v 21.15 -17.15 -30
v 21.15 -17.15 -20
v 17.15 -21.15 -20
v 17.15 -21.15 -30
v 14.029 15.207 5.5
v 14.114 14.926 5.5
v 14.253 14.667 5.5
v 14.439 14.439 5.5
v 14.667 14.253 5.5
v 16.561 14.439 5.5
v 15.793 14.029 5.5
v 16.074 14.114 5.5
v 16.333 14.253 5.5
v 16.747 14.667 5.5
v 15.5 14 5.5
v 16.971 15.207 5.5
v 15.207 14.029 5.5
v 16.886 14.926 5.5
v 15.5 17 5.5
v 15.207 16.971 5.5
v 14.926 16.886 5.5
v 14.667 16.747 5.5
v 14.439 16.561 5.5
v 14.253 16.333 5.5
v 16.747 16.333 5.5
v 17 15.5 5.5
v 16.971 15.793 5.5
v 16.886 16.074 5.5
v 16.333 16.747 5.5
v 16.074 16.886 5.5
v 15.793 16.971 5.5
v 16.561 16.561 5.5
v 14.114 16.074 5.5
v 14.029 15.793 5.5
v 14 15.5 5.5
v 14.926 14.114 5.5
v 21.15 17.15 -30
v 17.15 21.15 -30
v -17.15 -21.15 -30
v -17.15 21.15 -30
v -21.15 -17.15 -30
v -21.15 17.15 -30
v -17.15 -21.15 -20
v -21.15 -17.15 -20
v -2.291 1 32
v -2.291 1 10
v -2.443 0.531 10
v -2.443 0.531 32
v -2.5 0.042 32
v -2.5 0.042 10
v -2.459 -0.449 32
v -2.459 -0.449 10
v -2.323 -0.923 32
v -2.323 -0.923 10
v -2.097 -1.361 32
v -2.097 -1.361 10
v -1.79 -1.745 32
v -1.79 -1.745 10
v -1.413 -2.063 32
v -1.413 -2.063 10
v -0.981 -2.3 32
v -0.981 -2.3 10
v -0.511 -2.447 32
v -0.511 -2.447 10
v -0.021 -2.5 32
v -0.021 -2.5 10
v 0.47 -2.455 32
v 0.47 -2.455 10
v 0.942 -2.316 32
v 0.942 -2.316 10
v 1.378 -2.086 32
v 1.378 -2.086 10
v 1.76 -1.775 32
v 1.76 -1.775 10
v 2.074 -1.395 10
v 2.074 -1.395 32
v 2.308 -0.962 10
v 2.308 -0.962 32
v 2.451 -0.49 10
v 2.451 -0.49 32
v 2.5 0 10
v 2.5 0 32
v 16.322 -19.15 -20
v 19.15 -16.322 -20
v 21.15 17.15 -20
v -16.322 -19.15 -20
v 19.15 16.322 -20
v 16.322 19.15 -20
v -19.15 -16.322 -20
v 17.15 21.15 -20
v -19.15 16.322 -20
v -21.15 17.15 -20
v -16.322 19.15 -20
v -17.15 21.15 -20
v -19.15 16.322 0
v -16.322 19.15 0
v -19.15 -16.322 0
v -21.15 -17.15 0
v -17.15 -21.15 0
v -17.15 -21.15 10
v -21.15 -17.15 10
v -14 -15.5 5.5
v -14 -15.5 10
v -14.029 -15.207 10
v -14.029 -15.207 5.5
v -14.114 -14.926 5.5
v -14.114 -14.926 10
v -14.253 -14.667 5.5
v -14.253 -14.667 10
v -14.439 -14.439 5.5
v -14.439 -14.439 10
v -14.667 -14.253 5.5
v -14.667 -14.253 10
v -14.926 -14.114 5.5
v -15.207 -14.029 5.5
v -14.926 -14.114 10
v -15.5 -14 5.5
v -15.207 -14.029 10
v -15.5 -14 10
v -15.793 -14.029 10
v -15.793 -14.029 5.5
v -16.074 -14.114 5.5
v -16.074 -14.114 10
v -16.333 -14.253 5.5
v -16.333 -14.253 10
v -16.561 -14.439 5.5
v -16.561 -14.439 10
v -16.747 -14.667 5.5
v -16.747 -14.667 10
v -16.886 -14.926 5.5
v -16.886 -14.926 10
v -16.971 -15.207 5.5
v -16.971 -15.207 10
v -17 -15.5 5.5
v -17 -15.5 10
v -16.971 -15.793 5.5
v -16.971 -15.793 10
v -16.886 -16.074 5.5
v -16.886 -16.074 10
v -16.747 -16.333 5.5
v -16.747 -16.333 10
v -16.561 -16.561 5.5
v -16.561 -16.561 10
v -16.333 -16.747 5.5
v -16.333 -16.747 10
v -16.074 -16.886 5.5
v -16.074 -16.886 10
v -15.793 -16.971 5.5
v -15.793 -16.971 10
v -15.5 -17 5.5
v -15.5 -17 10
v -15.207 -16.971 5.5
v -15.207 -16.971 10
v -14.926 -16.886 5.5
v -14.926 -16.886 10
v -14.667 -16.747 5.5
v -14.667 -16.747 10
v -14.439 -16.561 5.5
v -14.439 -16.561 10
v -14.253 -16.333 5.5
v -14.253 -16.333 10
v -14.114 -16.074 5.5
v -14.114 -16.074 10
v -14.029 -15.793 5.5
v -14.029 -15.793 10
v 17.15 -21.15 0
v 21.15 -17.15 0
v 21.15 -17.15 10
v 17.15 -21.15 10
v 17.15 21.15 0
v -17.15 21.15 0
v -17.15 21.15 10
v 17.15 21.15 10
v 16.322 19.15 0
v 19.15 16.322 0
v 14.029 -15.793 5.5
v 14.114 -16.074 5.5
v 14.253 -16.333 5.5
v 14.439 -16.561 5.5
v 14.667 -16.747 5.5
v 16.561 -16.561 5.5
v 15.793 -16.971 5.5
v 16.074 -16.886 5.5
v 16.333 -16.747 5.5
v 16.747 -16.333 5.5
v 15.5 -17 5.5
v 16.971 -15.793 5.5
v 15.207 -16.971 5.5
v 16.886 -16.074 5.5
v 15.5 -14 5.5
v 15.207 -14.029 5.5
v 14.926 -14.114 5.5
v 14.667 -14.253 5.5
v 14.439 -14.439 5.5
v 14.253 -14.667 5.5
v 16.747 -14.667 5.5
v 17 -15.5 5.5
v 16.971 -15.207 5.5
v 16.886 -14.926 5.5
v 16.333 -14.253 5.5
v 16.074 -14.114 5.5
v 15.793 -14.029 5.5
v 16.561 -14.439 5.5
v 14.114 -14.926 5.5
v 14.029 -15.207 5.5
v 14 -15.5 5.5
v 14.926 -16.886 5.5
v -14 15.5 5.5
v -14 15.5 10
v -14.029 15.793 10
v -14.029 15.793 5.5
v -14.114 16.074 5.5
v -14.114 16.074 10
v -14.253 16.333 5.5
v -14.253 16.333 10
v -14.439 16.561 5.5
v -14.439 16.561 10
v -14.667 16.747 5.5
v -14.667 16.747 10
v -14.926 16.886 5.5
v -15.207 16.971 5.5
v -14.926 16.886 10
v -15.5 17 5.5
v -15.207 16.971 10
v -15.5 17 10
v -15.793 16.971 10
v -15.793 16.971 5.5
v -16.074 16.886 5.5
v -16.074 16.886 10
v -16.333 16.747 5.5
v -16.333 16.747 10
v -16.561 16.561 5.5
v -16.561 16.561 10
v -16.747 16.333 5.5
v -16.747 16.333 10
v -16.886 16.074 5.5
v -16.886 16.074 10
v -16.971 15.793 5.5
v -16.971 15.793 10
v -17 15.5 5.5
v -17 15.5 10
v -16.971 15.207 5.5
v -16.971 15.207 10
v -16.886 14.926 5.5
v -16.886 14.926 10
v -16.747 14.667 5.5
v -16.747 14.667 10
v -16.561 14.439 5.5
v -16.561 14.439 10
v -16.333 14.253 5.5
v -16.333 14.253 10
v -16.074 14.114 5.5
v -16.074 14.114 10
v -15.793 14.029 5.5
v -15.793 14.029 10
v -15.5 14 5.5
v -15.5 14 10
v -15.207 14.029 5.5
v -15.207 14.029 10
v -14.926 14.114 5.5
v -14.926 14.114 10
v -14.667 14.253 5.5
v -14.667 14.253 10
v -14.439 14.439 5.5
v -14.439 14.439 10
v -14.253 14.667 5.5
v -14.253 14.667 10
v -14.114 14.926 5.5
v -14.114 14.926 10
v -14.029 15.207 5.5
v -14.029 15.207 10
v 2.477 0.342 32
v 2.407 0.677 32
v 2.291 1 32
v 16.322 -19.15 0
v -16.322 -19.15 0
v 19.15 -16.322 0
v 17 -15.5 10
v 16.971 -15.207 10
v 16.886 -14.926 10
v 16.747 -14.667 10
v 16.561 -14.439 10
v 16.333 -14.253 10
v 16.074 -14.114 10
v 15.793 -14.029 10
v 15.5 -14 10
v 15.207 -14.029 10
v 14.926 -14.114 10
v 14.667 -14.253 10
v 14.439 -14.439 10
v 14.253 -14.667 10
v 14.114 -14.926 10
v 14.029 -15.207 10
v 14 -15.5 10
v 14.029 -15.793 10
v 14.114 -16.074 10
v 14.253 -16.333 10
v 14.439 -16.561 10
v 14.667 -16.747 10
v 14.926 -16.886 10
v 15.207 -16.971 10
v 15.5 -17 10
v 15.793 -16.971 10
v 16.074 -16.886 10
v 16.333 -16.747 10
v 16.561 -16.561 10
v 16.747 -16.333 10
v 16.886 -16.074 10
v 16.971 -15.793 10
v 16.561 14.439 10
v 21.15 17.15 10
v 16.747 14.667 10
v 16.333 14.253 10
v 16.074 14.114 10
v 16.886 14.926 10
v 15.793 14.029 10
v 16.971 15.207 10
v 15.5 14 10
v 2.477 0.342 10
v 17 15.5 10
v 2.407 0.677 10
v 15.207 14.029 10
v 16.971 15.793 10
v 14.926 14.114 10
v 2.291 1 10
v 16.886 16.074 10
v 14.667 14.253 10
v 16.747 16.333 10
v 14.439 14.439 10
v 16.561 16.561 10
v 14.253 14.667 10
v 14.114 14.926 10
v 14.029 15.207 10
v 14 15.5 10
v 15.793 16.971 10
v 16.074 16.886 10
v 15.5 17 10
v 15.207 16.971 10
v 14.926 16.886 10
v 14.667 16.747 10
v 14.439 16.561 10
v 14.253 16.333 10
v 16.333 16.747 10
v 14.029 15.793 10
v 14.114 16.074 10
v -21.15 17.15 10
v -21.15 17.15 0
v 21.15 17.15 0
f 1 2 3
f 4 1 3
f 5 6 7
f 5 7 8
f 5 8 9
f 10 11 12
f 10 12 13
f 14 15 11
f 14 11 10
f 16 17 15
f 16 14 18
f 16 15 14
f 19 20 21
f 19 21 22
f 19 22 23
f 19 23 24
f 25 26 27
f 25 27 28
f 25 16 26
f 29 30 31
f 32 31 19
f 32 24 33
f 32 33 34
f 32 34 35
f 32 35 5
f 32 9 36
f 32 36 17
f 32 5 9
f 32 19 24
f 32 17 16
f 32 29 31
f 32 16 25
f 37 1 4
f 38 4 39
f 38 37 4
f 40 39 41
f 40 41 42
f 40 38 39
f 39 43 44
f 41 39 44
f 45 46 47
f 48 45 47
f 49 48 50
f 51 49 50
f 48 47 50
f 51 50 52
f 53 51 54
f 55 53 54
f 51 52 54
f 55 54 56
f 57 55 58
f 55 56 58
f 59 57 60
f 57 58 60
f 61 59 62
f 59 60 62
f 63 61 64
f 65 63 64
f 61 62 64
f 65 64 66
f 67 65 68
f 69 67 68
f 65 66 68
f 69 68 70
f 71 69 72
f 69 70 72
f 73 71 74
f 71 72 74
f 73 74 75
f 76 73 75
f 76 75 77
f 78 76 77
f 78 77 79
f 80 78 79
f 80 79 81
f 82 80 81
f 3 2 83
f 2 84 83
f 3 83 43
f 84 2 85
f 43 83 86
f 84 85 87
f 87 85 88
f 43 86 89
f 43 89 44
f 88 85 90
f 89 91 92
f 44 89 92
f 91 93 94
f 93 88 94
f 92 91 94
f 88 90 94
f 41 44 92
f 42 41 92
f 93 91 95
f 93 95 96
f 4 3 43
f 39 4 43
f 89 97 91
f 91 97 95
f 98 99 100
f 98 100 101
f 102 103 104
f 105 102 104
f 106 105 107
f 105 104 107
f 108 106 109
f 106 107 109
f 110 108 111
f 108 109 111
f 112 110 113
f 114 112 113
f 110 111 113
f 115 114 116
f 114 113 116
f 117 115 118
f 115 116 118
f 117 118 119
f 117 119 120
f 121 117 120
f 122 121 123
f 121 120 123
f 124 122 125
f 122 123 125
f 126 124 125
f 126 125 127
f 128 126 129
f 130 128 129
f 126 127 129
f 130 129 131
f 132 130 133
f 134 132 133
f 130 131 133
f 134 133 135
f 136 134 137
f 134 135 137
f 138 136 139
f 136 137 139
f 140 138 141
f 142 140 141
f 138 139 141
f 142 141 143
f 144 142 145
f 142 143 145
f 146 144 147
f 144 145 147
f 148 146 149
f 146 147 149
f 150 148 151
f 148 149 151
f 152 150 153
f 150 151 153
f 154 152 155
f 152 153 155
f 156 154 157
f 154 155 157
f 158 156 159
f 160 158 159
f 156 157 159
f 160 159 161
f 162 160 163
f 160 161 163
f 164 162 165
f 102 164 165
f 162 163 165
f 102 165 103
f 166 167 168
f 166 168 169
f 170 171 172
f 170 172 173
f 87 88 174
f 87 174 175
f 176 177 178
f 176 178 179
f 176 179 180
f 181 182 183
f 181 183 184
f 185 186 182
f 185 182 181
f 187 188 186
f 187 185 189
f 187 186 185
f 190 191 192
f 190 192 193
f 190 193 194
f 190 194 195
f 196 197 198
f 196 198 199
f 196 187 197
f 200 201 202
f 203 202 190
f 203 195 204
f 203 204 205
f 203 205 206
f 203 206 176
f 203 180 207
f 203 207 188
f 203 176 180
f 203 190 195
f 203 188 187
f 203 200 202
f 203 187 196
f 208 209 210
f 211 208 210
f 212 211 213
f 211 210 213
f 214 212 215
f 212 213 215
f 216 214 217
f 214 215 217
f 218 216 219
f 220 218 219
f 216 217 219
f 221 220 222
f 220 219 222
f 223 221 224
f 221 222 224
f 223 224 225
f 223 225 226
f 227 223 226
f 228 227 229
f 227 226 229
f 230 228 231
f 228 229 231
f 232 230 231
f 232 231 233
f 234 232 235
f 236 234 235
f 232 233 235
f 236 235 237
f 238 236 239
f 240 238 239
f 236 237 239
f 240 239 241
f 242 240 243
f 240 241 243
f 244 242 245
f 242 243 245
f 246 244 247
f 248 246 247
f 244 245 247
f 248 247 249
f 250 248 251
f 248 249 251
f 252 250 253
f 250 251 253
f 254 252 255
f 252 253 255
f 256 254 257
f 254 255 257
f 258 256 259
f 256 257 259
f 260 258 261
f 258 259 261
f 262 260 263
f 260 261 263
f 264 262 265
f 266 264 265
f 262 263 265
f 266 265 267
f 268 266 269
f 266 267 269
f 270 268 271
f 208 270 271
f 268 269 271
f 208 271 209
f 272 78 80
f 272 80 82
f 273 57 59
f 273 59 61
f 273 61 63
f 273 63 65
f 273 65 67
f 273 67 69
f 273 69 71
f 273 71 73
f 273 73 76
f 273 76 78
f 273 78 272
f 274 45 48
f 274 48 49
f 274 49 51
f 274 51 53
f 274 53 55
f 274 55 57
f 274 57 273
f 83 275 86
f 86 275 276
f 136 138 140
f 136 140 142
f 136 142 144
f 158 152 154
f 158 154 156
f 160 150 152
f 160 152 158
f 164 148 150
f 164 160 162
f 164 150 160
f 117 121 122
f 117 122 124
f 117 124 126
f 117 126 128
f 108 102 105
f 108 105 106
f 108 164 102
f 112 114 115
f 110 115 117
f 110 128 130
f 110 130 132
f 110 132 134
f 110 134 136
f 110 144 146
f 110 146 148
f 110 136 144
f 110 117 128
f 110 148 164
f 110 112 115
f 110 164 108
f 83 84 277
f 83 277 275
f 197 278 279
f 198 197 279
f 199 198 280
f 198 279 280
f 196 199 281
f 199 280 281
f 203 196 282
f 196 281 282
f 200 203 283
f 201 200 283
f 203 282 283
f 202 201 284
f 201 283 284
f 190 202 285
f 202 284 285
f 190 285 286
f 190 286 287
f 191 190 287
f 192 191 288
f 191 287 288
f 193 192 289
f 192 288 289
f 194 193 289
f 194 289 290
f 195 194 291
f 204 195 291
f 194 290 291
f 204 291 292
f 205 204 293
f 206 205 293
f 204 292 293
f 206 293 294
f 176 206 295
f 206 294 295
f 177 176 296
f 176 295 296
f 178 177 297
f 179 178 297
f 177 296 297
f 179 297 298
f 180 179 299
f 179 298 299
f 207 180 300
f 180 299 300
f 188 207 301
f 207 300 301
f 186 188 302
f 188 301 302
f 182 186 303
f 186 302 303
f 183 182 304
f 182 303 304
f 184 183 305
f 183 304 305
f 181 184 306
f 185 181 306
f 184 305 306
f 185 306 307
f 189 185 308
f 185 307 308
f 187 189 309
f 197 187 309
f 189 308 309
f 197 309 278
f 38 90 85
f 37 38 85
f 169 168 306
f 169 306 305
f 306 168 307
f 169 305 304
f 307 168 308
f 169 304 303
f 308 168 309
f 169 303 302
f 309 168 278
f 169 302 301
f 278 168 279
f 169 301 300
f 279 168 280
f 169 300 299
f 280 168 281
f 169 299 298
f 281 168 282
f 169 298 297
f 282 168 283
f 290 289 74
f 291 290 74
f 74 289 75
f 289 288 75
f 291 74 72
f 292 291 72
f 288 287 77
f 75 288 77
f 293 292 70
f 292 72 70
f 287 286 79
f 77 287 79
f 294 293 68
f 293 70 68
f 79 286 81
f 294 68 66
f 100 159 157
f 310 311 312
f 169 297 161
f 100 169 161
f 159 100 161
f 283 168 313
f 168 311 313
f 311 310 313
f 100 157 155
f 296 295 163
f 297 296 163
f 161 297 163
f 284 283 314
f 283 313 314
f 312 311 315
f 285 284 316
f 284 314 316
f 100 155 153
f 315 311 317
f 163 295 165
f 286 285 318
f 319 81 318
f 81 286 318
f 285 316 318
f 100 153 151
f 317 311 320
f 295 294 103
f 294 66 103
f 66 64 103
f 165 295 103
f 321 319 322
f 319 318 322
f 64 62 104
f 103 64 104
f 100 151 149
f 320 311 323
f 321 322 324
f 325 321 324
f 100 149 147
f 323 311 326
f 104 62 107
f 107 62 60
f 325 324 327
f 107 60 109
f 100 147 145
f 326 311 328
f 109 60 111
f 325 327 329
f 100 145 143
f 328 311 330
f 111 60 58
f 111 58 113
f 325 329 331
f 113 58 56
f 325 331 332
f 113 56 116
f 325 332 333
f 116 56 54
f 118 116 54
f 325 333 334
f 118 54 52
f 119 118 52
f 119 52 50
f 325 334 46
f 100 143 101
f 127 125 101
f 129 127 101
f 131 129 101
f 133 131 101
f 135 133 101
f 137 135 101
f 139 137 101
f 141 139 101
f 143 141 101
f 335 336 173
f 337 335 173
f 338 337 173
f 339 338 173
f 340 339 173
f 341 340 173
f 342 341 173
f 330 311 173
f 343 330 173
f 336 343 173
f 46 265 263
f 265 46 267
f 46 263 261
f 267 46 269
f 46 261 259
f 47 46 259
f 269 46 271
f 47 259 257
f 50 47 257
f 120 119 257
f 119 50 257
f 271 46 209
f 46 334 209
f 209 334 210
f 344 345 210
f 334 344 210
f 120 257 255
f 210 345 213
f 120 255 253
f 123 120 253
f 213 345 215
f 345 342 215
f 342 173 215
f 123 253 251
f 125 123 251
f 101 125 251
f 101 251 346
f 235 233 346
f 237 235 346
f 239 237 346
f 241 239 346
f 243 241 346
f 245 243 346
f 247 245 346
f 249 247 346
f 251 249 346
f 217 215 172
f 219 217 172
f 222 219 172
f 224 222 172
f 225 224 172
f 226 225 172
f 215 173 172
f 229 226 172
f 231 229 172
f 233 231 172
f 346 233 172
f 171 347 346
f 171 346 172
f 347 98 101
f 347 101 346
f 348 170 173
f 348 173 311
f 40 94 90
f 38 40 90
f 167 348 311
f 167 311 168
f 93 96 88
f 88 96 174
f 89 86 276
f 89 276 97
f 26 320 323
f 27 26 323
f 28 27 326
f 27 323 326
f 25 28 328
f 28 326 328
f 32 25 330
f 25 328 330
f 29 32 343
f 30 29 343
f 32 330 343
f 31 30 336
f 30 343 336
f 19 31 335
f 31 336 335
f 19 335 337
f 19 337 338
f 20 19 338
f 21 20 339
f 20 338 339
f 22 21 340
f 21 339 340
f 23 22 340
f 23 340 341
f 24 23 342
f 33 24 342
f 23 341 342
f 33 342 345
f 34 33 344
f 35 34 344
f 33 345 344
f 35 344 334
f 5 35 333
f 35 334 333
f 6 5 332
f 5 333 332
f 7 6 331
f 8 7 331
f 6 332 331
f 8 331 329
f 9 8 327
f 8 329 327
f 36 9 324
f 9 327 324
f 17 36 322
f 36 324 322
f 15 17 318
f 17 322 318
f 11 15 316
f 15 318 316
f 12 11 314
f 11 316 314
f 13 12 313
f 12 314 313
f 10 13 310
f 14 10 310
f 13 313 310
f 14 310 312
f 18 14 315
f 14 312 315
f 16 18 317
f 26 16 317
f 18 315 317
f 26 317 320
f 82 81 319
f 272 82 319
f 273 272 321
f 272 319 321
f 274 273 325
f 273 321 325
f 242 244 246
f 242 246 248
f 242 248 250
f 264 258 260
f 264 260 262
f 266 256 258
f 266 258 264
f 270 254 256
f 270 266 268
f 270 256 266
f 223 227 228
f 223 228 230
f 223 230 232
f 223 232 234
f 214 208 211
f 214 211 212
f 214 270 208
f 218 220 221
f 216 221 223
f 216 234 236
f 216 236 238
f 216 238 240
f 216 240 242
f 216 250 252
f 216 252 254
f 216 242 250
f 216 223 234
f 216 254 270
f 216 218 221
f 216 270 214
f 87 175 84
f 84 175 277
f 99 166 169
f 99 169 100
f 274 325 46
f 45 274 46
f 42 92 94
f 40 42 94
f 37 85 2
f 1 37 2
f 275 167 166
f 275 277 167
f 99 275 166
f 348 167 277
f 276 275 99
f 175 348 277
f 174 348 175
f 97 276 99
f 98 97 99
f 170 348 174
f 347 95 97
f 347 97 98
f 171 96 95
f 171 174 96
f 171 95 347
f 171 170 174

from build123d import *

# Parameters (mm, degrees)
BOSS_EXTRUDE1_DEPTH = 10
BOSS_EXTRUDE2_DEPTH = 20
BOSS_EXTRUDE3_DEPTH = 10
BOSS_EXTRUDE4_DEPTH = 22
SKETCH6_R           = 1.5
CUT_EXTRUDE1_DEPTH  = 4.5


with BuildPart() as part:
    # Sketch1 → Boss-Extrude1 (new body)
    with BuildSketch(Plane.XY):
        Polygon((-21.15, 17.15), (-17.15, 21.15), (17.15, 21.15), (21.15, 17.15), (21.15, -17.15), (17.15, -21.15), (-17.15, -21.15), (-21.15, -17.15), align=None)
    extrude(amount=BOSS_EXTRUDE1_DEPTH)

    # Sketch2 → Boss-Extrude2 (add)
    with BuildSketch(Plane(origin=(0, 0, 0), x_dir=(-1, 0, 0), z_dir=(0, 0, -1))):
        Polygon((19.15, 16.321572875), (16.321572875, 19.15), (-16.321572875, 19.15), (-19.15, 16.321572875), (-19.15, -16.321572875), (-16.321572875, -19.15), (16.321572875, -19.15), (19.15, -16.321572875), align=None)
    extrude(amount=BOSS_EXTRUDE2_DEPTH)

    # Sketch3 → Boss-Extrude3 (add)
    with BuildSketch(Plane(origin=(0, 0, -20), x_dir=(-1, 0, 0), z_dir=(0, 0, -1))):
        Polygon((21.15, 17.15), (17.15, 21.15), (-17.15, 21.15), (-21.15, 17.15), (-21.15, -17.15), (-17.15, -21.15), (17.15, -21.15), (21.15, -17.15), align=None)
    extrude(amount=BOSS_EXTRUDE3_DEPTH)

    # Sketch4 → Boss-Extrude4 (add)
    with BuildSketch(Plane.XY.offset(10)):
        with BuildLine():
            Line((2.291287847, 1), (-2.291287847, 1))
            ThreePointArc((-2.291287847, 1), (-0.510774109, -2.447265782), (2.5, 0))
            ThreePointArc((2.5, 0), (2.447265782, 0.510774109), (2.291287847, 1))
        make_face()
    extrude(amount=BOSS_EXTRUDE4_DEPTH)

    # Sketch6 → Cut-Extrude1 (cut)
    with BuildSketch(Plane.XY.offset(10)):
        with Locations((-15.5, 15.5)):
            Circle(SKETCH6_R)
        with Locations((15.5, 15.5)):
            Circle(SKETCH6_R)
        with Locations((15.5, -15.5)):
            Circle(SKETCH6_R)
        with Locations((-15.5, -15.5)):
            Circle(SKETCH6_R)
    extrude(amount=-CUT_EXTRUDE1_DEPTH, mode=Mode.SUBTRACT)


solid = part.part
